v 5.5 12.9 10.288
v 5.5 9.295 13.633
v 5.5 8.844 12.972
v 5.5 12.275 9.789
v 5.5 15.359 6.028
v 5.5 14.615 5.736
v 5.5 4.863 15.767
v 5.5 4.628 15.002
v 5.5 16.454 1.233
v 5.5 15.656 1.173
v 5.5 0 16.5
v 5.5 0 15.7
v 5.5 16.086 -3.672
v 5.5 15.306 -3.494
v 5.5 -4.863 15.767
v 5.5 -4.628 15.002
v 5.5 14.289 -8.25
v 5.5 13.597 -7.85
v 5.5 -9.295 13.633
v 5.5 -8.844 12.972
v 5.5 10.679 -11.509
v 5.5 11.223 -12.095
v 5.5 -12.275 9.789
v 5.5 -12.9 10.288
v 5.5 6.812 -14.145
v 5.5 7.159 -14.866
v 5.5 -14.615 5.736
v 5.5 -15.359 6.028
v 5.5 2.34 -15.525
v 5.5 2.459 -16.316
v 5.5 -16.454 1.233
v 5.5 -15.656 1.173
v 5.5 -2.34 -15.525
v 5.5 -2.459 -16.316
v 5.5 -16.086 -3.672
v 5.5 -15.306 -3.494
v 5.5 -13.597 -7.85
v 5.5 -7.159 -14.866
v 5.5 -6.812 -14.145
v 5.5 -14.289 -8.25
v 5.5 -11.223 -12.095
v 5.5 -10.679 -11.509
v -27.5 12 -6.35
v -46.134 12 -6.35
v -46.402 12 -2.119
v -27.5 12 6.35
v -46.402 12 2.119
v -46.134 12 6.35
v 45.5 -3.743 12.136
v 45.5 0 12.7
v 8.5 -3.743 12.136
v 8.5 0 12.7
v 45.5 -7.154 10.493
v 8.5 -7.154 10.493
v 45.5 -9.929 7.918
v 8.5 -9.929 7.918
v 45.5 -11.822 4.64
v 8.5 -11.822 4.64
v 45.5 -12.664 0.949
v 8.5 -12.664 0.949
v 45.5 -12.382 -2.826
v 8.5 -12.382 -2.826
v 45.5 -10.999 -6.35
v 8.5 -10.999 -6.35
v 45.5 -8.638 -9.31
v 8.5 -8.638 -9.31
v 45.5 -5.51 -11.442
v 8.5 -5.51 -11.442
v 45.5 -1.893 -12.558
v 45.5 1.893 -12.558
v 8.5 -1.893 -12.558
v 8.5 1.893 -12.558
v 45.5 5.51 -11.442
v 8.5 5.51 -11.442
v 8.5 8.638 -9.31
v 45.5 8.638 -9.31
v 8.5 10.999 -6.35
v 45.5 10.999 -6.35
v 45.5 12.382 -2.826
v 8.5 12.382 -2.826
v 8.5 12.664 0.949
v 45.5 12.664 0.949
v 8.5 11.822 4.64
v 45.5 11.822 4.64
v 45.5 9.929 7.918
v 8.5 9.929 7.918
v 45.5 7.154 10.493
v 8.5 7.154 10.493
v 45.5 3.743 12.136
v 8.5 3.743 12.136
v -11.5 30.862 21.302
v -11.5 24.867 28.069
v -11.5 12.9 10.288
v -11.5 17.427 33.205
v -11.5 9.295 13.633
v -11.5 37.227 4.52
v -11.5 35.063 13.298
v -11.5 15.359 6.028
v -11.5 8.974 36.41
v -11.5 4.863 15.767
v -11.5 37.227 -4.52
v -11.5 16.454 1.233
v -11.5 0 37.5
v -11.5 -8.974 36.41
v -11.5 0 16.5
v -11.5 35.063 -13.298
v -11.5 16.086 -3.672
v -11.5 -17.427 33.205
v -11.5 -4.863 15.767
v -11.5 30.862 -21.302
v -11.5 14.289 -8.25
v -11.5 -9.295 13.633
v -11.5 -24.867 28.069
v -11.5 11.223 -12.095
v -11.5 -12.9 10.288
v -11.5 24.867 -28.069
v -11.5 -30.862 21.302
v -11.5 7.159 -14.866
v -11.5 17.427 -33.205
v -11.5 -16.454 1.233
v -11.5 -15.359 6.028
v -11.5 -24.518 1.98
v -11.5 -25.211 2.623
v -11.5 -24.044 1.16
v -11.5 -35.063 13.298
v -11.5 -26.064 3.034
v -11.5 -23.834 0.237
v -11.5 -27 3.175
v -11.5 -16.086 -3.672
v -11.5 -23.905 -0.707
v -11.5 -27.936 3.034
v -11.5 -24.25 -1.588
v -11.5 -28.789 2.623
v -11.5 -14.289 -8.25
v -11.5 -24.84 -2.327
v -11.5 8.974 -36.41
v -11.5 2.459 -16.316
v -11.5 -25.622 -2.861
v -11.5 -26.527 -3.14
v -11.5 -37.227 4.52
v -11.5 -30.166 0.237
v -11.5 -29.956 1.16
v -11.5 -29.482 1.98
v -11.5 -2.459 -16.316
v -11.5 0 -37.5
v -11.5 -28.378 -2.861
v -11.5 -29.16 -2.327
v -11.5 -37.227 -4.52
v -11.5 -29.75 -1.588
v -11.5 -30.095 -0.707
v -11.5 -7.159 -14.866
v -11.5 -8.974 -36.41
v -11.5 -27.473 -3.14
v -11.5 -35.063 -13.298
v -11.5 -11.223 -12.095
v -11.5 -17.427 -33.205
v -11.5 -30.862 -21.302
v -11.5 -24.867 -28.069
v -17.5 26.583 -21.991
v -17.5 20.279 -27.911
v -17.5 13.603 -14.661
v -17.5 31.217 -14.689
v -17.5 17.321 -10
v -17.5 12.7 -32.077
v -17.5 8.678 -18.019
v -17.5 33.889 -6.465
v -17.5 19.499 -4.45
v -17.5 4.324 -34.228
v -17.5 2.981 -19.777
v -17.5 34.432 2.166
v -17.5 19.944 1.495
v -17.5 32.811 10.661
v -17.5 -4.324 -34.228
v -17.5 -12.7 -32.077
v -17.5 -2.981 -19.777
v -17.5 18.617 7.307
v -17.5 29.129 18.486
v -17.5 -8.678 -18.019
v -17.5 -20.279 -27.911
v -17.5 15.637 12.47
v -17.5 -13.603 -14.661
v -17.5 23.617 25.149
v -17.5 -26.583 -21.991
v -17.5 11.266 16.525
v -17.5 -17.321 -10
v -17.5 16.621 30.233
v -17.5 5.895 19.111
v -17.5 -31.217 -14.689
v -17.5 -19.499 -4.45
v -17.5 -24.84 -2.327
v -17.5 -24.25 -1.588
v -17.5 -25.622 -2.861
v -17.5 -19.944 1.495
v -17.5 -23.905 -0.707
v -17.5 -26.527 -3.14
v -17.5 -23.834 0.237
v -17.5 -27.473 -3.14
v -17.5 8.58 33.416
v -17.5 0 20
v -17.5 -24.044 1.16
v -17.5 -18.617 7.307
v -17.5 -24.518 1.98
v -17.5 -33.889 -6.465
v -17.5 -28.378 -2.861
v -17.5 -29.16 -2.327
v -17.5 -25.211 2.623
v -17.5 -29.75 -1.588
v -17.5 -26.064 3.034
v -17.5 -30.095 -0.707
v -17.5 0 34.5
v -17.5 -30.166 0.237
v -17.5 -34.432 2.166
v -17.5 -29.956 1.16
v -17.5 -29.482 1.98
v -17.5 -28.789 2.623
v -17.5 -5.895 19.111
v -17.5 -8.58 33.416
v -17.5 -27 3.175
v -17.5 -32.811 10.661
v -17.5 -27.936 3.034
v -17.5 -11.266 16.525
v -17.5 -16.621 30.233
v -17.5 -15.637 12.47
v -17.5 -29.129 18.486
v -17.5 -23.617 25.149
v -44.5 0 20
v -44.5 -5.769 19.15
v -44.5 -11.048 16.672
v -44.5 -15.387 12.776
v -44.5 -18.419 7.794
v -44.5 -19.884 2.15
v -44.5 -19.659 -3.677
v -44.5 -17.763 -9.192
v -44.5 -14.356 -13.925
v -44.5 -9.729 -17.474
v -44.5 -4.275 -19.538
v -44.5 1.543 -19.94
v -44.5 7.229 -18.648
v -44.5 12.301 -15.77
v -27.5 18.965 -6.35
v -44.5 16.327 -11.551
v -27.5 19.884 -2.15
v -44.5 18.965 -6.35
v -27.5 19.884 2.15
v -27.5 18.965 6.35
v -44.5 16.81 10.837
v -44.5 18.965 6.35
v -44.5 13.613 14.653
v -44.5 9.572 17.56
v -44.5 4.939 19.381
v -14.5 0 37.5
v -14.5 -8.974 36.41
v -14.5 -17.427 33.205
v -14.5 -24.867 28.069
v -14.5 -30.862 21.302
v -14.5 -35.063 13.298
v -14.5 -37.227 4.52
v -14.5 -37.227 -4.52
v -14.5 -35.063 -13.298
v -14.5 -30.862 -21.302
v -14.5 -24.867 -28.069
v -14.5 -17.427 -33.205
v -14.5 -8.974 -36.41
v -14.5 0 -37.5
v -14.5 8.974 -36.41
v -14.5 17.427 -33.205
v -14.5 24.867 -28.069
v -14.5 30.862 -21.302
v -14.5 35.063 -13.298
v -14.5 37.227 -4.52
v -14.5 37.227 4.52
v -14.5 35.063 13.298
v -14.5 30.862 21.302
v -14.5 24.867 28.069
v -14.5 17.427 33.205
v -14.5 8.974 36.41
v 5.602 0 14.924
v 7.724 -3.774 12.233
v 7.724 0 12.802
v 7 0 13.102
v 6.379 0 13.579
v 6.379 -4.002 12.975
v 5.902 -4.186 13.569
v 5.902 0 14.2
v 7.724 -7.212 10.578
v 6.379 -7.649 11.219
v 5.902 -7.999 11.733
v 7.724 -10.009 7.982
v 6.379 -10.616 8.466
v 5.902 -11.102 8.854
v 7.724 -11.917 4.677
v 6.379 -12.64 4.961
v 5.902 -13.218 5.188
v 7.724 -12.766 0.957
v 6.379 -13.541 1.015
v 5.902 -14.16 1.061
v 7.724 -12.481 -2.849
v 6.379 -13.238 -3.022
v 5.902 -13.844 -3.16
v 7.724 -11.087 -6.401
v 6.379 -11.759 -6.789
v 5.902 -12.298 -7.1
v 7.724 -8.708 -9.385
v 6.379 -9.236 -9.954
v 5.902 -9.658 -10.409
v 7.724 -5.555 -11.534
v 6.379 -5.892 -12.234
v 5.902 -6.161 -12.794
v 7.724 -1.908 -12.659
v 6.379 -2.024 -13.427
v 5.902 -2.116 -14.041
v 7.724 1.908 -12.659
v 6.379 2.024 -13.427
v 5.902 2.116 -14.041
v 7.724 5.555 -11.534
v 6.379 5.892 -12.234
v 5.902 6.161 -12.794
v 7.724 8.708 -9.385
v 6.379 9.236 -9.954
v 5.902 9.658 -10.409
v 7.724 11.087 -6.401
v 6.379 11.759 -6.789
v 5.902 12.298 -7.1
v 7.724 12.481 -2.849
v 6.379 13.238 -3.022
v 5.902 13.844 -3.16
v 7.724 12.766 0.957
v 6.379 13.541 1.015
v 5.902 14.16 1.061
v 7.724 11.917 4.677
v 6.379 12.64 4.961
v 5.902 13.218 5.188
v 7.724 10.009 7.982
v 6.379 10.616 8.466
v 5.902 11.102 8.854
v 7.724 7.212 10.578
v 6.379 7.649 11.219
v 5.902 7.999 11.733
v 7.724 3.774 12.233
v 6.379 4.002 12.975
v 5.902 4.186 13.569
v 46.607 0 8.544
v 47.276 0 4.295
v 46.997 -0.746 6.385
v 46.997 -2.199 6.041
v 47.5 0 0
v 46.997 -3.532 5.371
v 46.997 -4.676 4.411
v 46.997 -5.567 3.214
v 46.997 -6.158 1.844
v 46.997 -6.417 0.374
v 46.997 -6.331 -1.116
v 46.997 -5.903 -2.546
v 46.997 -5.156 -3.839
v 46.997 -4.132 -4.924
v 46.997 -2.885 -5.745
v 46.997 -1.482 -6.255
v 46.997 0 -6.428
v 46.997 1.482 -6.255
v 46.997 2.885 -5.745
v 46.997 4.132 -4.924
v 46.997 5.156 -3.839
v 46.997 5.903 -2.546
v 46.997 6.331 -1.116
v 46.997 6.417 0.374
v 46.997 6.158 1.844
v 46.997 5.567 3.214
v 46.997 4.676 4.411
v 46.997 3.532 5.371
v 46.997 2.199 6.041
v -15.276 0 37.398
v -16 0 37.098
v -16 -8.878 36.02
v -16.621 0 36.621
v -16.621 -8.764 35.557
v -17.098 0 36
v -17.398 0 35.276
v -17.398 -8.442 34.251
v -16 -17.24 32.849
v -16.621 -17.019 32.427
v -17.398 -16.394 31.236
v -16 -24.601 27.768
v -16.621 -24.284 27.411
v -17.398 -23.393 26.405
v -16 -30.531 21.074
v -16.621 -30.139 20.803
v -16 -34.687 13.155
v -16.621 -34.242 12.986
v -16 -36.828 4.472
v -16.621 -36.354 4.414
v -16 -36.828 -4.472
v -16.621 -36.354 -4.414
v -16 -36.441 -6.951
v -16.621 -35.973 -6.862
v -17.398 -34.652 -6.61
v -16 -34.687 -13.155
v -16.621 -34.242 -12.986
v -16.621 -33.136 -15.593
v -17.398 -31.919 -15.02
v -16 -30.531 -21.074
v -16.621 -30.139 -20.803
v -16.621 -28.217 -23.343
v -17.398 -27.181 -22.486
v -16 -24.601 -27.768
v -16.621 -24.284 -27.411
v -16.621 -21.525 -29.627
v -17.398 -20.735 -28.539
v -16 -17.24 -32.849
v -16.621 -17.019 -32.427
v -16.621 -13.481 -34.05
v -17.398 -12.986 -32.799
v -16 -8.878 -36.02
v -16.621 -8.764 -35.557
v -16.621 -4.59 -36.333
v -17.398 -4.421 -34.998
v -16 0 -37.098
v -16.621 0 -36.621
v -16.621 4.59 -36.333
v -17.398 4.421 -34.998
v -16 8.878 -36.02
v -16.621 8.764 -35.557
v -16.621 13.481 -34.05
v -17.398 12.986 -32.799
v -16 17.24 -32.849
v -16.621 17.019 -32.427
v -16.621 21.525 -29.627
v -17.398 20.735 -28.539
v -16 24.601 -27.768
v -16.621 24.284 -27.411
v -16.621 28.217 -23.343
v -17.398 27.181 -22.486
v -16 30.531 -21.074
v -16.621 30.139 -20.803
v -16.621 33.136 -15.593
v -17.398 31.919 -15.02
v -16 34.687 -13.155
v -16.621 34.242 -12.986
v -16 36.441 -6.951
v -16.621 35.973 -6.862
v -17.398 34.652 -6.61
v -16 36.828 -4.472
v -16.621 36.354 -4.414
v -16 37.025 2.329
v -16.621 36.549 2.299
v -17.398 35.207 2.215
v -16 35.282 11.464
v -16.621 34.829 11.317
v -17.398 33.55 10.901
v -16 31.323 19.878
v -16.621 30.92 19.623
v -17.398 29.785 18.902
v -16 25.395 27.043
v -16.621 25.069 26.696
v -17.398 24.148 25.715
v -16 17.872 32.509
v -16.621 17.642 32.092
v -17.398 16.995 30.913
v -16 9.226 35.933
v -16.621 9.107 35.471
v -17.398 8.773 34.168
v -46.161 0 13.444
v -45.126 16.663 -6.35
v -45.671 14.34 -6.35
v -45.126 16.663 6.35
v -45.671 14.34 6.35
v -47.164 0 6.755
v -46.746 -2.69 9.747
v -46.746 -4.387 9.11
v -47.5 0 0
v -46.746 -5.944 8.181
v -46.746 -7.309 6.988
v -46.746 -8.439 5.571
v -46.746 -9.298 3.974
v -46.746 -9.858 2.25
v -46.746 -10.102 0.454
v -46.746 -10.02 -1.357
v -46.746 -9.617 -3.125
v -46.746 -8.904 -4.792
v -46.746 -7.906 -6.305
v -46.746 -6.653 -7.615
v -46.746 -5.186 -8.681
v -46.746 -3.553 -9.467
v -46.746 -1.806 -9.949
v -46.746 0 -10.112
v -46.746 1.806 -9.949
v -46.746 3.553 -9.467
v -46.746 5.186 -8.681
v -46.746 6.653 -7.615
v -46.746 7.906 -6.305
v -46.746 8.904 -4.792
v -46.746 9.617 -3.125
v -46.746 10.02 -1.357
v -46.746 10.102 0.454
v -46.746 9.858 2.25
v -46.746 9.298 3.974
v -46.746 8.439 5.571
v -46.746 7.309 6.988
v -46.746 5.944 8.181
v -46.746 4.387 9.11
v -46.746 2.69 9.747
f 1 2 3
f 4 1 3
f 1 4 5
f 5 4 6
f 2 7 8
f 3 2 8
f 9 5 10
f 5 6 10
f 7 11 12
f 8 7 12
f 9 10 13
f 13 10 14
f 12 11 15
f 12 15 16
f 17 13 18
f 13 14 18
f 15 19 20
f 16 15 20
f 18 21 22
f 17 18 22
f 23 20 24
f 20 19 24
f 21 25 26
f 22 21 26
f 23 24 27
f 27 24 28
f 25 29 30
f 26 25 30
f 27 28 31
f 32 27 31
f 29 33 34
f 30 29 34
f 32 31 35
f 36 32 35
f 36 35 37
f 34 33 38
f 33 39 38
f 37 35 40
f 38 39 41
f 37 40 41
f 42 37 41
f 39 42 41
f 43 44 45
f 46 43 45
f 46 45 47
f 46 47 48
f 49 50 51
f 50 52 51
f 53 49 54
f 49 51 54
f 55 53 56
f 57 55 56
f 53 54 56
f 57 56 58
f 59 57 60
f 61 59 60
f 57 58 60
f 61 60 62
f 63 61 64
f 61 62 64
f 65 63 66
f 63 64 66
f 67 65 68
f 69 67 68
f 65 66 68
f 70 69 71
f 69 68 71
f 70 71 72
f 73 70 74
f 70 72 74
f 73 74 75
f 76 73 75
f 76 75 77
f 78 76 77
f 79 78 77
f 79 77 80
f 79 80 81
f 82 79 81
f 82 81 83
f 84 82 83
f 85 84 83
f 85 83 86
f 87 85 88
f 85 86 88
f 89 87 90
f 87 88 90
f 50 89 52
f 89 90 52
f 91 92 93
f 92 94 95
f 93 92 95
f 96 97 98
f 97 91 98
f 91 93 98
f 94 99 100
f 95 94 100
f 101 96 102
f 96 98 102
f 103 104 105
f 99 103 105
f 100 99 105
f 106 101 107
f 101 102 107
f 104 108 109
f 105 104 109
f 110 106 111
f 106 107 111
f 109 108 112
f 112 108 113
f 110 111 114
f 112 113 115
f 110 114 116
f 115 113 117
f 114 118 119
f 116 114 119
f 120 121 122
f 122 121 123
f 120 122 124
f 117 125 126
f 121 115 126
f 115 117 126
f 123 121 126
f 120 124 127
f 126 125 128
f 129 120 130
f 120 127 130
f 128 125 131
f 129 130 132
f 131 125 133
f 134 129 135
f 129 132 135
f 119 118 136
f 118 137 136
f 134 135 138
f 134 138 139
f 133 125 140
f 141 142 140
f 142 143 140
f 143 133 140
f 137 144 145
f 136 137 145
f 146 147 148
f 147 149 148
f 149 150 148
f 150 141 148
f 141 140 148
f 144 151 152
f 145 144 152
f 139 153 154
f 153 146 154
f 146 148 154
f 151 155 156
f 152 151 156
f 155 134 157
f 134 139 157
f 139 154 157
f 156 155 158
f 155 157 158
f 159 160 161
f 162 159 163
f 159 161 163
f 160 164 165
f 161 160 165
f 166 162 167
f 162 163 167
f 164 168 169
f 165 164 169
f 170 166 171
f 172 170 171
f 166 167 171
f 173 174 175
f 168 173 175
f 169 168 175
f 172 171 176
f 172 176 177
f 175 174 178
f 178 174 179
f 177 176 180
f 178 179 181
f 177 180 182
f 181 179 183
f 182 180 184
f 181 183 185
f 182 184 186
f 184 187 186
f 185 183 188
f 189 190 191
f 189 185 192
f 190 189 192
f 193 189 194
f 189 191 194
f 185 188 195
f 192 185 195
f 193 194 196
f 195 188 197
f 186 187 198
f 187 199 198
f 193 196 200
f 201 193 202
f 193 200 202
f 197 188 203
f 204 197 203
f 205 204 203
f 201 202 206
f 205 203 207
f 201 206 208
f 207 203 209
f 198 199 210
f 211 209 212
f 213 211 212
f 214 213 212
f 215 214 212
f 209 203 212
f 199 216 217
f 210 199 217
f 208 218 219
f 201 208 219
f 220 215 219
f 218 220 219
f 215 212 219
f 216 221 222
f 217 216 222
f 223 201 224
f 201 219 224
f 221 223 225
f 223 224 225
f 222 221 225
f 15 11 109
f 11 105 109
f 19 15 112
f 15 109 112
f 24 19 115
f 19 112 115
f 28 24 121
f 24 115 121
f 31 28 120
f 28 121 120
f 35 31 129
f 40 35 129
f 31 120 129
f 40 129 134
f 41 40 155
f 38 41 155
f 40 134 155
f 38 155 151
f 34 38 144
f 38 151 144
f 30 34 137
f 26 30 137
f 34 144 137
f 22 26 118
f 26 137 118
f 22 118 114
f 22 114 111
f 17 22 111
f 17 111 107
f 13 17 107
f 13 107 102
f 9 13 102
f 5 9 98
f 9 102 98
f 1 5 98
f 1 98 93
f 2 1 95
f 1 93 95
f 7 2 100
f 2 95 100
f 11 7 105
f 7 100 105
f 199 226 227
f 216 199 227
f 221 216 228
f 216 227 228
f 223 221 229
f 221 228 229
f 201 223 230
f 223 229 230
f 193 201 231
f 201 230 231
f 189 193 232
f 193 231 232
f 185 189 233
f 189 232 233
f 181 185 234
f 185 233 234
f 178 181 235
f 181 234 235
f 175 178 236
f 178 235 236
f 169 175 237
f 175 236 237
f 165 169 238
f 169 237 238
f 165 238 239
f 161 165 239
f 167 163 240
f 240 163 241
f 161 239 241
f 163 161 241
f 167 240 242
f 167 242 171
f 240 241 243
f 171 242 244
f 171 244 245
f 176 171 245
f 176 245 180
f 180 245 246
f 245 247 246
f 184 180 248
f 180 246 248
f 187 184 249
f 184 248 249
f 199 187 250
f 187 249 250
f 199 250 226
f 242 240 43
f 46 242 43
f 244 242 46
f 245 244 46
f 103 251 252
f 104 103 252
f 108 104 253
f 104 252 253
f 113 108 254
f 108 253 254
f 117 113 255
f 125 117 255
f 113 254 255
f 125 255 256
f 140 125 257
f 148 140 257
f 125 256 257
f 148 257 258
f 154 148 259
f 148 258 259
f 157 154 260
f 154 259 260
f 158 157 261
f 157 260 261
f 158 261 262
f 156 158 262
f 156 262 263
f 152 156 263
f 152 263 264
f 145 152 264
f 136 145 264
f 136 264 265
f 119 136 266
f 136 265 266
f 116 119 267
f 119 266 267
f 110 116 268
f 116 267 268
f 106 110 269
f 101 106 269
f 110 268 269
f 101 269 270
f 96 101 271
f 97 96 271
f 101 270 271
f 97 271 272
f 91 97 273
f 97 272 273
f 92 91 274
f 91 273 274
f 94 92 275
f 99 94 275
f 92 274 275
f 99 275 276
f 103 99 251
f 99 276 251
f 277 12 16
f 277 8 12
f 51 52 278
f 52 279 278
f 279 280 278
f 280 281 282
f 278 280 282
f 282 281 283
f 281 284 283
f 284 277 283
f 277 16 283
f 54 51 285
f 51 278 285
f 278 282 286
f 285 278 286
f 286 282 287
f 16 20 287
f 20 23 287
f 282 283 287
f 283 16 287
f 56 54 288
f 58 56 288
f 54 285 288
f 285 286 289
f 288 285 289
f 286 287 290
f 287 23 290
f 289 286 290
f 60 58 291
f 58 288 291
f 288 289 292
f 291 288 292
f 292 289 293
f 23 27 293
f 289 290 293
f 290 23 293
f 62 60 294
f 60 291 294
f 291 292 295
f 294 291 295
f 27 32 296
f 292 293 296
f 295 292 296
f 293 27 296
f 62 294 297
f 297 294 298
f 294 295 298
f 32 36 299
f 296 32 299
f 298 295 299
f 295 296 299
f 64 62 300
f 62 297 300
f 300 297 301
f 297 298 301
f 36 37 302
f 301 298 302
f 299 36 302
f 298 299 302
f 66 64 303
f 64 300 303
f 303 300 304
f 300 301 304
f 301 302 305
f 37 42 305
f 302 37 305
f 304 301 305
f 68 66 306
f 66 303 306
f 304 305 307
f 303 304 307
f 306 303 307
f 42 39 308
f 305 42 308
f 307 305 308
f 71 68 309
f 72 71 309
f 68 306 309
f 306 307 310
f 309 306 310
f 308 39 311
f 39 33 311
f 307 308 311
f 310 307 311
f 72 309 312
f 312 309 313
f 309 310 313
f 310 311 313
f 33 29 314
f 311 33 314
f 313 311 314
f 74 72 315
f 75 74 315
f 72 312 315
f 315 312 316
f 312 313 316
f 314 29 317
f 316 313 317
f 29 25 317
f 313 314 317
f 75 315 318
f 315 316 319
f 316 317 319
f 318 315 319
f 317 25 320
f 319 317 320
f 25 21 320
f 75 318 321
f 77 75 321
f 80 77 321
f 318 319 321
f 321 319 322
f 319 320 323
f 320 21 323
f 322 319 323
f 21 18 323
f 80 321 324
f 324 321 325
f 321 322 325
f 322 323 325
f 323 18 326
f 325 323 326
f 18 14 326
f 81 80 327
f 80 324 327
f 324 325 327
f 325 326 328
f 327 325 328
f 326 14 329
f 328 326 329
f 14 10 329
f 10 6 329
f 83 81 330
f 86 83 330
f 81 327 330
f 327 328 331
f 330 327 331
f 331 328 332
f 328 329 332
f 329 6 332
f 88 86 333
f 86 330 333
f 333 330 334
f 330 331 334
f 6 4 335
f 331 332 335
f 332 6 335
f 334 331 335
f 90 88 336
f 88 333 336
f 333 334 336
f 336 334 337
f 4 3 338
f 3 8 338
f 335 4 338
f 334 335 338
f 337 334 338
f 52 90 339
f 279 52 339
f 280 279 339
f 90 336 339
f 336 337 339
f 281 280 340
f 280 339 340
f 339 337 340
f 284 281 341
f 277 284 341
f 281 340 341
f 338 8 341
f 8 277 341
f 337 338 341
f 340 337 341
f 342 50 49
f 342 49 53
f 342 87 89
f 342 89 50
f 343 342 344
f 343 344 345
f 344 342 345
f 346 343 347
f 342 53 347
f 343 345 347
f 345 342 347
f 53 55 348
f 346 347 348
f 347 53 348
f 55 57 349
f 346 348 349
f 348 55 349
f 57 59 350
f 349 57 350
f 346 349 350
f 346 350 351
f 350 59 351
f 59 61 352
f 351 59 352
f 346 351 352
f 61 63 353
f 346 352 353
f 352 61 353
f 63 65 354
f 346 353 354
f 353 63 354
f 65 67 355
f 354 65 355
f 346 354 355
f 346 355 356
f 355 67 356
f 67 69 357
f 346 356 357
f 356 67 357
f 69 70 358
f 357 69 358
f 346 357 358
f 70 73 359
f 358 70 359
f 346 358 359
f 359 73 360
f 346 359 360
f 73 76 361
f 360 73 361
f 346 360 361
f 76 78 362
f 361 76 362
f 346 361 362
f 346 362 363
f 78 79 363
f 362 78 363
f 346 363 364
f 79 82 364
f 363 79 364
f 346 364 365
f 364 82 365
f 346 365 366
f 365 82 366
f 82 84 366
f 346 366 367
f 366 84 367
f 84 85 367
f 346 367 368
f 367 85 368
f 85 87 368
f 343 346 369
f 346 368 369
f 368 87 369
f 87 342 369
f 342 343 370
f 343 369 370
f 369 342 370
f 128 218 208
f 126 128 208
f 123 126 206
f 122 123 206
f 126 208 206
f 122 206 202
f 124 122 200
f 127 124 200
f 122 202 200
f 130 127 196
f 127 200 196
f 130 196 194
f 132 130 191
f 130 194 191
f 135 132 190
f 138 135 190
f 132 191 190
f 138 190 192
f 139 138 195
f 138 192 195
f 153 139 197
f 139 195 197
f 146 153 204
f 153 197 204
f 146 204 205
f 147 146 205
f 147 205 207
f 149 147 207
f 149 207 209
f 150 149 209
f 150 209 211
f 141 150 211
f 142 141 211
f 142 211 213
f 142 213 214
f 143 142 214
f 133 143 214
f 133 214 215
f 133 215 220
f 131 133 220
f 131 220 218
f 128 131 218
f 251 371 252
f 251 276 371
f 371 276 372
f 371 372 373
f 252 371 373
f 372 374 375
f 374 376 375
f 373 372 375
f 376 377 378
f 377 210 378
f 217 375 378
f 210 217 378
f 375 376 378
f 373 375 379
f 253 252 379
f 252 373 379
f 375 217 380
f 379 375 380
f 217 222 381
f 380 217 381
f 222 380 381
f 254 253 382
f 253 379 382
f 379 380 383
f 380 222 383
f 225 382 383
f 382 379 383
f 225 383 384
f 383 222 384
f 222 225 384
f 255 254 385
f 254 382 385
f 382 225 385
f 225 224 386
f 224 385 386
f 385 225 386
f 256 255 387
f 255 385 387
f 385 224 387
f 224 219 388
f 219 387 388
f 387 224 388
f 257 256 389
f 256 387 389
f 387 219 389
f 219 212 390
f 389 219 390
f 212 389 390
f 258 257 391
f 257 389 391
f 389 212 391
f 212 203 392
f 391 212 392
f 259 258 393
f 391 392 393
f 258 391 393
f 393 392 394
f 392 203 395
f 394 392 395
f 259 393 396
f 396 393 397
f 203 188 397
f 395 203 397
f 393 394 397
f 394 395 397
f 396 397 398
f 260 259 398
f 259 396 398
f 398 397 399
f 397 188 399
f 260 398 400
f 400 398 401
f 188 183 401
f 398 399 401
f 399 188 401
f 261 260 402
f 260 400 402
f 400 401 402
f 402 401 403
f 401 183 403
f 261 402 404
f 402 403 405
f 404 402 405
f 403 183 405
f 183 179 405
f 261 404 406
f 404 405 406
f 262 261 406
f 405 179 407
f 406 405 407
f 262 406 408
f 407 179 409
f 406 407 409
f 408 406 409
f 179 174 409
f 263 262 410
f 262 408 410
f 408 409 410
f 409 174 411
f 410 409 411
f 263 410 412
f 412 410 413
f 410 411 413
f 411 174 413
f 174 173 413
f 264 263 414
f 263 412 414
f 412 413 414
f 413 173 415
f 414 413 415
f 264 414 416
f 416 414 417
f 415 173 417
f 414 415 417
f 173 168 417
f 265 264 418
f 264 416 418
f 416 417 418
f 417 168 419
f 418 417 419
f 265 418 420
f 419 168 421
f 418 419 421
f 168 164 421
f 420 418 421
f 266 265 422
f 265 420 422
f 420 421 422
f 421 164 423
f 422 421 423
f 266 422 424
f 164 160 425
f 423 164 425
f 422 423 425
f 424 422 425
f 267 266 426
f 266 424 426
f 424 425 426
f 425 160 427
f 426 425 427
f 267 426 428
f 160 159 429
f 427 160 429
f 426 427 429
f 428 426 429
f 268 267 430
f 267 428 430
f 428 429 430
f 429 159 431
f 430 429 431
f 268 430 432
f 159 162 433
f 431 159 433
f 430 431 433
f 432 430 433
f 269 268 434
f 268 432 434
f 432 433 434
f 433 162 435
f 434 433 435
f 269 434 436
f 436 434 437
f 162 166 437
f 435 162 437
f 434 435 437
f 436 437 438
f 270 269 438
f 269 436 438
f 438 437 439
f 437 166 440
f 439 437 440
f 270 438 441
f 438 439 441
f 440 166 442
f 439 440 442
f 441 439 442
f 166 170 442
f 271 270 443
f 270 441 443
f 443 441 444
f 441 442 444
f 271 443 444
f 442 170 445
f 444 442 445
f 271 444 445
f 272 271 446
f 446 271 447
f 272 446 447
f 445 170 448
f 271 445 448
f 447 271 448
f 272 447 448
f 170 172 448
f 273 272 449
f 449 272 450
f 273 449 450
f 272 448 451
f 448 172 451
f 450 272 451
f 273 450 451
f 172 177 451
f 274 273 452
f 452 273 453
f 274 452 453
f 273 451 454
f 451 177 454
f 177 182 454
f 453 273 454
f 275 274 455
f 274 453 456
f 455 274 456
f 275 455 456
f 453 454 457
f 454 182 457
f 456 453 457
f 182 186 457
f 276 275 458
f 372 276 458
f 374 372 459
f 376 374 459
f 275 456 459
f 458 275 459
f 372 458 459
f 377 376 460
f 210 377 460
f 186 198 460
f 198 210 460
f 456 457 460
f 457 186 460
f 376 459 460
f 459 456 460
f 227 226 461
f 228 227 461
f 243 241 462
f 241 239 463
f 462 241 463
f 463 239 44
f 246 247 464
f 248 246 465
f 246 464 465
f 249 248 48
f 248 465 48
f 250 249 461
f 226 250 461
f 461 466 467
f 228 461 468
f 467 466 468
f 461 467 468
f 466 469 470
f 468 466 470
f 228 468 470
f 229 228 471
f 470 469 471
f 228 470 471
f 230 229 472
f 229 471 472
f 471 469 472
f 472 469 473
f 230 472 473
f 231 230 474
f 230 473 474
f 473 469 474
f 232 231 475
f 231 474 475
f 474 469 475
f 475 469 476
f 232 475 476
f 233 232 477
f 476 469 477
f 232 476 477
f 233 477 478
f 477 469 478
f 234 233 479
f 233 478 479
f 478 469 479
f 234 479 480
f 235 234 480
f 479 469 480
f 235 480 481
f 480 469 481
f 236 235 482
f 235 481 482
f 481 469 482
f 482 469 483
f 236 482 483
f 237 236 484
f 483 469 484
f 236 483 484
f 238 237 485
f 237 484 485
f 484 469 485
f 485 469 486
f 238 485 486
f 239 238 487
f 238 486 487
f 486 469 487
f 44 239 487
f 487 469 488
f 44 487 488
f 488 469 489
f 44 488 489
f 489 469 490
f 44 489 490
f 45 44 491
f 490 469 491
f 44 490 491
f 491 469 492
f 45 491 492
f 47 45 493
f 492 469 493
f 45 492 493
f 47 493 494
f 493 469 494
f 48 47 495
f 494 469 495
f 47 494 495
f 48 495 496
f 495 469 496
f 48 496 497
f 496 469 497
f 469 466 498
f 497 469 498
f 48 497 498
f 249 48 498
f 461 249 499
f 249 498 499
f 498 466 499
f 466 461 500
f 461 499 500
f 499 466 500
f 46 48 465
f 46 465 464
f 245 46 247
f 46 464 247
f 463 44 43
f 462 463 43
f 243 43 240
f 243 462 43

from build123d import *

# Parameters (mm, degrees)
FILETE1_R             = 3
ESBO_O2_W             = 12.7
ESBO_O2_H             = 16
CORTE_EXTRUS_O1_DEPTH = 20
ESBO_O3_R             = 3.175
CORTE_EXTRUS_O2_DEPTH = 20


with BuildPart() as part:
    # Esboço1 → Revolução1 (revolve)
    with BuildSketch(Plane.XY, mode=Mode.PRIVATE) as revolu_o1_sk:
        with BuildLine():
            Line((45.5, 12.7), (8.5, 12.7))
            ThreePointArc((8.5, 12.7), (6.378679656, 13.578679656), (5.5, 15.7))
            Line((5.5, 15.7), (5.5, 16.5))
            Line((5.5, 16.5), (-11.5, 16.5))
            Line((-11.5, 16.5), (-11.5, 37.5))
            Line((-11.5, 37.5), (-17.5, 37.5))
            Line((-17.5, 37.5), (-17.5, 20))
            Line((-17.5, 20), (-44.5, 20))
            ThreePointArc((-44.5, 20), (-46.745828054, 10.111874208), (-47.5, 0))
            Line((-47.5, 0), (47.5, 0))
            ThreePointArc((47.5, 0), (46.996937848, 6.428257929), (45.5, 12.7))
        make_face()
    revolve(revolu_o1_sk.sketch.rotate(Axis((-47.5, 0, 0), (1, 0, 0)), 90), axis=Axis((-47.5, 0, 0), (1, 0, 0)))  # turned: the seam where the file's is

    # Filete1
    filete1_edges = [part.edges().sort_by_distance(p)[0] for p in [
        (-17.5, 0, -37.5),
    ]]
    fillet(filete1_edges, radius=FILETE1_R)

    # Esboço2 → Corte-extrusão1 (cut)
    with BuildSketch(Plane.ZY.offset(47.5)):
        with Locations((0, 20)):
            Rectangle(ESBO_O2_W, ESBO_O2_H)
    extrude(amount=-CORTE_EXTRUS_O1_DEPTH, mode=Mode.SUBTRACT)

    # Esboço3 → Corte-extrusão2 (cut)
    with BuildSketch(Plane.ZY.offset(17.5)):
        with Locations((0, -27)):
            Circle(ESBO_O3_R)
    extrude(amount=-CORTE_EXTRUS_O2_DEPTH, mode=Mode.SUBTRACT)


solid = part.part
